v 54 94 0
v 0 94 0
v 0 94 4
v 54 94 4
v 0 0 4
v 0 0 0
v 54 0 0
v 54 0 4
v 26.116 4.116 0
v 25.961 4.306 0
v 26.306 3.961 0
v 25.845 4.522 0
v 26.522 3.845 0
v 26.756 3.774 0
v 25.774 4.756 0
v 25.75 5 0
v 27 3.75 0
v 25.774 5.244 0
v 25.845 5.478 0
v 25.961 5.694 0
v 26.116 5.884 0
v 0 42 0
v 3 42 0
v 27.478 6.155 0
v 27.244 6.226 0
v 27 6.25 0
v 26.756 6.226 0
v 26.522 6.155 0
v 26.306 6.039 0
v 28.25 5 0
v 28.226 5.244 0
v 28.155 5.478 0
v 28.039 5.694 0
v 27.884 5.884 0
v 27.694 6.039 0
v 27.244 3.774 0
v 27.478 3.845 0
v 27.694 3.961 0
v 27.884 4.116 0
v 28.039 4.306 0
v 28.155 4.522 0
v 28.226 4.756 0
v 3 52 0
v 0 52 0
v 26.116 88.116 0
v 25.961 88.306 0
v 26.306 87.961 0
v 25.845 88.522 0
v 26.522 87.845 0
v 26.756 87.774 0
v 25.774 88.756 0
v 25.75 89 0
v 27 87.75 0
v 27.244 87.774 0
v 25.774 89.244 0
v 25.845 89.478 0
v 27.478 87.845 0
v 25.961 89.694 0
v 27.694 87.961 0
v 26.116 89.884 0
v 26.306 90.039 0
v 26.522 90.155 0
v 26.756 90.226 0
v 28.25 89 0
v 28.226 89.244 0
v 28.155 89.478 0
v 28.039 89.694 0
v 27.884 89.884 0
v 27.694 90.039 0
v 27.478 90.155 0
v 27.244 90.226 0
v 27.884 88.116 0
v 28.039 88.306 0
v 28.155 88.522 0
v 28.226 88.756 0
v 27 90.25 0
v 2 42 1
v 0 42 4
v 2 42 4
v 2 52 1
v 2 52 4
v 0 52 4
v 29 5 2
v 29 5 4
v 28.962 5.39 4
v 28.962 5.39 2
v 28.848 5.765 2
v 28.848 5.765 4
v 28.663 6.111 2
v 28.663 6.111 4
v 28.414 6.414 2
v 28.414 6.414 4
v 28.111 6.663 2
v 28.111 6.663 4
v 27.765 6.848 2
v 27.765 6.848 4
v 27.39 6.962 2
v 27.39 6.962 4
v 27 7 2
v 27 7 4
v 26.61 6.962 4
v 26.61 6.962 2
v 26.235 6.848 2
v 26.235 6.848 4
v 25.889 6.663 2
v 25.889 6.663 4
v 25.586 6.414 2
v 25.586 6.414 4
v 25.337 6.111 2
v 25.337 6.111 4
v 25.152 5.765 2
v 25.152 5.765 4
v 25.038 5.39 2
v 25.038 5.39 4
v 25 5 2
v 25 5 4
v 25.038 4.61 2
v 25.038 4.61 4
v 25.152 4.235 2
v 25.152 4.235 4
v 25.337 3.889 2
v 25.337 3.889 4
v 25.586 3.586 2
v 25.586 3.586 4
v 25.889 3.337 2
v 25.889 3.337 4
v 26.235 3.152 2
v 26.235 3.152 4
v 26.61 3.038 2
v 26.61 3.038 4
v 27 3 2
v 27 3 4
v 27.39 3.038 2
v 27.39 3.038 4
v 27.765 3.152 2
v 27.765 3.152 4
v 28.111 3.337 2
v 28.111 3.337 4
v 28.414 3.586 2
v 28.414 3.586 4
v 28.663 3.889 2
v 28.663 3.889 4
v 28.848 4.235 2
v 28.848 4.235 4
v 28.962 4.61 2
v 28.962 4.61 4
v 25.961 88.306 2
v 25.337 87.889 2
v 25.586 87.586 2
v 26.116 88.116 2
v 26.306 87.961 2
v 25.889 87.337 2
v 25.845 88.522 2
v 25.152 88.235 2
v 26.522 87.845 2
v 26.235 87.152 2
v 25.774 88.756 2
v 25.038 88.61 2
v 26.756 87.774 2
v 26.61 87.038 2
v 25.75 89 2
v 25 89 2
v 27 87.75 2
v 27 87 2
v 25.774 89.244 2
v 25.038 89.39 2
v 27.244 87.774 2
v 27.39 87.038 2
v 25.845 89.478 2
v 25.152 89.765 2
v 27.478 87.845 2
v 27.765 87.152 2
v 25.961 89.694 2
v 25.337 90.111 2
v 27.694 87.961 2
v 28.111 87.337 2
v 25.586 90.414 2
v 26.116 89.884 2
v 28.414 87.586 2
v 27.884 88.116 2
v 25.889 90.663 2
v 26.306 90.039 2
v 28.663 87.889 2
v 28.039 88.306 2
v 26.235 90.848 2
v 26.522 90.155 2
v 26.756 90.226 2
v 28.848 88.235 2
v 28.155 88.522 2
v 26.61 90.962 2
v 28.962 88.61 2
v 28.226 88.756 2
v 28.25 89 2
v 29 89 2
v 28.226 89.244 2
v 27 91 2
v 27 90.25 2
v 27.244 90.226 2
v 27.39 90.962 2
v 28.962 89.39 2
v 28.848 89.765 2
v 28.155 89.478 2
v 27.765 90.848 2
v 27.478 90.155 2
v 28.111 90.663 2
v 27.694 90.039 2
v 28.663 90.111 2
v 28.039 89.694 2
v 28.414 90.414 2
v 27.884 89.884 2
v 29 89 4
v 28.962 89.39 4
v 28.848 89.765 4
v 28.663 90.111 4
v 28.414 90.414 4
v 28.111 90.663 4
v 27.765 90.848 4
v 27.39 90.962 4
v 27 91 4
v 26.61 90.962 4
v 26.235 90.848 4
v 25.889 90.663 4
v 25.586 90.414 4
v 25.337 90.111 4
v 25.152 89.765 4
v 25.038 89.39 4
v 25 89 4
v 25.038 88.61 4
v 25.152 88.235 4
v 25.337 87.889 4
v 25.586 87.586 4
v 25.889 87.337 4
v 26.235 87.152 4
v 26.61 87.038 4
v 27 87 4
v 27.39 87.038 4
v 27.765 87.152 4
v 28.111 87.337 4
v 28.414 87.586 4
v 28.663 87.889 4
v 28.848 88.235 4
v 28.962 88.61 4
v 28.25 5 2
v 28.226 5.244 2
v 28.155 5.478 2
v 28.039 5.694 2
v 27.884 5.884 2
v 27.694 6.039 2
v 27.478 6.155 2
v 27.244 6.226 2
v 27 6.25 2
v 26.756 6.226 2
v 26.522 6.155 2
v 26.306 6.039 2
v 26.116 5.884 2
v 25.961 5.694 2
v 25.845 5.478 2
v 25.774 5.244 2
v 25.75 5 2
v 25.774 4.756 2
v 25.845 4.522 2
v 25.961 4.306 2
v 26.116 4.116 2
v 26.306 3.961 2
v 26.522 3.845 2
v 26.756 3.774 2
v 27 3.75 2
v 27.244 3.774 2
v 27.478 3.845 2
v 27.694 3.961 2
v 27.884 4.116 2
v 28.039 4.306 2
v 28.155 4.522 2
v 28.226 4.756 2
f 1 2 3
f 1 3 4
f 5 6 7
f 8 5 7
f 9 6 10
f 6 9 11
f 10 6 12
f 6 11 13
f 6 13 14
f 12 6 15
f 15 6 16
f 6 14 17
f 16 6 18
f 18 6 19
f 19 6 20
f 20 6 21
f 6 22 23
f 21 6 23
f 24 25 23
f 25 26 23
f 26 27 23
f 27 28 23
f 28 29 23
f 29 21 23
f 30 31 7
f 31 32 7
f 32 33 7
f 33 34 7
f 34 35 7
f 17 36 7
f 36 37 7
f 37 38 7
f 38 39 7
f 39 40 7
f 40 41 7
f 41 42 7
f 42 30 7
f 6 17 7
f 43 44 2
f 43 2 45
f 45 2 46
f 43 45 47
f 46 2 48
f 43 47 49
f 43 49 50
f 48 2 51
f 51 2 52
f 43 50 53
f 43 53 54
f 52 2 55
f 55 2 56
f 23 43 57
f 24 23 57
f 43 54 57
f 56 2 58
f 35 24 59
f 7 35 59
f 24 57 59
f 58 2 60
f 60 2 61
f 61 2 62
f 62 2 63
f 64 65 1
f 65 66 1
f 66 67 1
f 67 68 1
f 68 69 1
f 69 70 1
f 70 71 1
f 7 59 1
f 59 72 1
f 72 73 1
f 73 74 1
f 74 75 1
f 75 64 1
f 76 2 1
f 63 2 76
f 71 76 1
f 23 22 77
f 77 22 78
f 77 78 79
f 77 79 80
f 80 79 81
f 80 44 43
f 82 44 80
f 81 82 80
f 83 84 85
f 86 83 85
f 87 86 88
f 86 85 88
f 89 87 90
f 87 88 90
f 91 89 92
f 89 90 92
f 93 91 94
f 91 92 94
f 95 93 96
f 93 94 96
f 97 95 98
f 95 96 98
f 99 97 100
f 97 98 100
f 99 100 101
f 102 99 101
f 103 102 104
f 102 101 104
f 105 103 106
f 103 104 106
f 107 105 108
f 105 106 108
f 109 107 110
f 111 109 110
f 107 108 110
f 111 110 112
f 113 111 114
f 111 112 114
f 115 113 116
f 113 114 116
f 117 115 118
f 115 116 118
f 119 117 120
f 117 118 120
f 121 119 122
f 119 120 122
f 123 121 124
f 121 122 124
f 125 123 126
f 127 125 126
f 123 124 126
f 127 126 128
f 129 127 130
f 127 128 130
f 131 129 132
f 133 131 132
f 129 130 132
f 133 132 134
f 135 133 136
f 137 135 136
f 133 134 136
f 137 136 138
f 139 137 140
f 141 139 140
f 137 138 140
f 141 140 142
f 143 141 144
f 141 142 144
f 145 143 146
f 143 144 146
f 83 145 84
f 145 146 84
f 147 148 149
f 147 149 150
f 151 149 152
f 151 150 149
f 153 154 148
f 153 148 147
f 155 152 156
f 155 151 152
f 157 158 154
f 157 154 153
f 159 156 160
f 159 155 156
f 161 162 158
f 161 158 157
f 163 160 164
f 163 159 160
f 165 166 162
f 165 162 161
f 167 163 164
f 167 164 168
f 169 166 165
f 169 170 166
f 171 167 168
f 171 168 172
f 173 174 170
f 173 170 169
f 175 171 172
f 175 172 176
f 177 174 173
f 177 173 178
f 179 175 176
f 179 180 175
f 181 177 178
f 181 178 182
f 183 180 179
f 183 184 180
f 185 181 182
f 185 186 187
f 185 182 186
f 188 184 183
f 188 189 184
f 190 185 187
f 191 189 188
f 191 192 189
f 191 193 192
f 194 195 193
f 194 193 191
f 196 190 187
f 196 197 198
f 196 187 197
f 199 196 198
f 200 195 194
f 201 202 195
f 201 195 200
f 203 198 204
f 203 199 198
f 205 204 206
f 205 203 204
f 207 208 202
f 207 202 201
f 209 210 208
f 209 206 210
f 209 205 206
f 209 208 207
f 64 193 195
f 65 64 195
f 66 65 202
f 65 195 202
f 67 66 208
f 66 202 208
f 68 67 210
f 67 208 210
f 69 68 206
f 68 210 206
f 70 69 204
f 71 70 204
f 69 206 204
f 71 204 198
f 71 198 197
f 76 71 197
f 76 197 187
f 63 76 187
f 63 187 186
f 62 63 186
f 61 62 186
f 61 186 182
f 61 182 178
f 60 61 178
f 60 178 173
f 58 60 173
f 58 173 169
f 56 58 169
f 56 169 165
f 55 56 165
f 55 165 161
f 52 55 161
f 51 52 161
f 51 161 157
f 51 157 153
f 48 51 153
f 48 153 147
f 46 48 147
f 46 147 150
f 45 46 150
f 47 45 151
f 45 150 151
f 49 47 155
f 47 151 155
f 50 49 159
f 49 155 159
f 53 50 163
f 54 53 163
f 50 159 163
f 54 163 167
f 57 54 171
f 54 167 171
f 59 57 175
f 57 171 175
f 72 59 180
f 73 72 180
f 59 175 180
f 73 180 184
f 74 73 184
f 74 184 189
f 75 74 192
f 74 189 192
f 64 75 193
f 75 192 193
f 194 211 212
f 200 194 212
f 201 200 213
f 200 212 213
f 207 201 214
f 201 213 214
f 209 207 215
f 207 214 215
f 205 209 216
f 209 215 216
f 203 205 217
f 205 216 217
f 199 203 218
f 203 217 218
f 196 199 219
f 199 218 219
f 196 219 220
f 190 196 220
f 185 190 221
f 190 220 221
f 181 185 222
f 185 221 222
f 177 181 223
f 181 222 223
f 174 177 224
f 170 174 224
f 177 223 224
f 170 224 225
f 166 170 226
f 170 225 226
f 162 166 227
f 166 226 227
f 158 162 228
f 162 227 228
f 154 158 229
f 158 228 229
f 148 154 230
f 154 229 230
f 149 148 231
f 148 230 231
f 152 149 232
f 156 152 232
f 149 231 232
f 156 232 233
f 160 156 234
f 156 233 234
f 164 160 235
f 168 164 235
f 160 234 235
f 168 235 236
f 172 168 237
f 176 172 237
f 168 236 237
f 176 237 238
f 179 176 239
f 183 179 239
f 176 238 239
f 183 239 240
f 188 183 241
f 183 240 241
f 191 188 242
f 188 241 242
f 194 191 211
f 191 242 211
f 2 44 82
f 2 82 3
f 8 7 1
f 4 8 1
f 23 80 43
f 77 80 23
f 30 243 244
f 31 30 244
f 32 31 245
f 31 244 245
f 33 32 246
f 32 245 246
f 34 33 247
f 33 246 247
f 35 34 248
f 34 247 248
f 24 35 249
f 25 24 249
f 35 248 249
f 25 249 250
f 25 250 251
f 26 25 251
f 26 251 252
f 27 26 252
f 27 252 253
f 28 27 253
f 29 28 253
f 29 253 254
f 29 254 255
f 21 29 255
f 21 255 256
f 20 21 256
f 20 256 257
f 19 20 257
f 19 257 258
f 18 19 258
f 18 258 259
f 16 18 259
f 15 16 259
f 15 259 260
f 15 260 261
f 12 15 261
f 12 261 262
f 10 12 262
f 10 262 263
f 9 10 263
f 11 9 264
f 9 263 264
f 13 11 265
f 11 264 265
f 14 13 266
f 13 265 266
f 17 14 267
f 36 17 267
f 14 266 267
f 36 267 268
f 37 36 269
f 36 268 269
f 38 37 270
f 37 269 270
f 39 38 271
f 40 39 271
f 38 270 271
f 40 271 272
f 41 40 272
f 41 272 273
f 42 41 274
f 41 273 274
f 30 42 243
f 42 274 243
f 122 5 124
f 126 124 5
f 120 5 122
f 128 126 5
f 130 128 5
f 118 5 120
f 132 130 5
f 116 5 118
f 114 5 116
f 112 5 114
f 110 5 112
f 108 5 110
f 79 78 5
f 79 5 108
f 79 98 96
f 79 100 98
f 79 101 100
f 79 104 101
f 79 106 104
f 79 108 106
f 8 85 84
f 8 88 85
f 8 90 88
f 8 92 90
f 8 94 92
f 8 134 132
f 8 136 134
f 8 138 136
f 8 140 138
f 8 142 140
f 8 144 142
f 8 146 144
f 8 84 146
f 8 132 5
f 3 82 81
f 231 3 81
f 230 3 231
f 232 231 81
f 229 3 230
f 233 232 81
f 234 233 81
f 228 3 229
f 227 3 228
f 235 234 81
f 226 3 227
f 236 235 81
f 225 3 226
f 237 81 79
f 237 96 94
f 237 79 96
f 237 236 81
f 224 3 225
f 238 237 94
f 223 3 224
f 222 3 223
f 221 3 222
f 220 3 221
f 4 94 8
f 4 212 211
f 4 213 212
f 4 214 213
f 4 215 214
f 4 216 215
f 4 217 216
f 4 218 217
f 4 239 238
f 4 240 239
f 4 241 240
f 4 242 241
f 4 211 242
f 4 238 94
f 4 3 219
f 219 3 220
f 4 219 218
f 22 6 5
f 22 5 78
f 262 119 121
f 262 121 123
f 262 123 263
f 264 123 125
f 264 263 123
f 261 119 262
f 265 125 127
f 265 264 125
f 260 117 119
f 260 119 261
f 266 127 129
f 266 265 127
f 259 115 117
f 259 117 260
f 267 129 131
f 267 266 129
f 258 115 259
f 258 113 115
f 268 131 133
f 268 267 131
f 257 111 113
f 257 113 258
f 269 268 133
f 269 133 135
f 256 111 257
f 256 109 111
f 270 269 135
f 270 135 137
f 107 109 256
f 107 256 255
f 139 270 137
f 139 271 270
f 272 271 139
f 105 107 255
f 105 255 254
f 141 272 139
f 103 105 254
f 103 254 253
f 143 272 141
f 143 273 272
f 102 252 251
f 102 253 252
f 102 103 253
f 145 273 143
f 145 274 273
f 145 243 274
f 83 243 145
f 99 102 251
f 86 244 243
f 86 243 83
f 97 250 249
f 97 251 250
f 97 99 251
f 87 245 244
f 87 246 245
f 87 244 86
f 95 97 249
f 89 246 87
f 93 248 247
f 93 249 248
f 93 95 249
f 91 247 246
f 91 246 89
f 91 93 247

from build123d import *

# Parameters (mm, degrees)
SKETCH1_W           = 54
SKETCH1_H           = 94
BOSS_EXTRUDE1_DEPTH = 4
CUT_EXTRUDE1_REACH  = 6
SKETCH2_W           = 2
SKETCH2_H           = 10
SKETCH3_R           = 1.25
CUT_EXTRUDE2_DEPTH  = 5
CHAMFER1_SIZE       = 1
SKETCH4_R           = 2
CUT_EXTRUDE3_DEPTH  = 2


with BuildPart() as part:
    # Sketch1 → Boss-Extrude1 (new body)
    with BuildSketch(Plane.XY):
        with Locations((27, 47)):
            Rectangle(SKETCH1_W, SKETCH1_H)
    extrude(amount=BOSS_EXTRUDE1_DEPTH)

    # Sketch2 → Cut-Extrude1 (cut, up to next)
    with BuildSketch(Plane.XY.offset(4), mode=Mode.PRIVATE) as cut_extrude1_sk1:
        with Locations((1, 47)):
            Rectangle(SKETCH2_W, SKETCH2_H)
    cut_extrude1_tool1 = extrude(cut_extrude1_sk1.sketch, amount=-CUT_EXTRUDE1_REACH, mode=Mode.PRIVATE) & part.part
    add(cut_extrude1_tool1.solids().sort_by_distance((1, 47, 4))[0], mode=Mode.SUBTRACT)

    # Sketch3 → Cut-Extrude2 (cut, through all)
    with BuildSketch(Plane.XY.offset(4)):
        with Locations((27, 89)):
            Circle(SKETCH3_R)
        with Locations((27, 5)):
            Circle(SKETCH3_R)
    extrude(amount=-CUT_EXTRUDE2_DEPTH, mode=Mode.SUBTRACT)

    # Chamfer1
    chamfer1_edges = [part.edges().sort_by_distance(p)[0] for p in [
        (2, 47, 0),
    ]]
    chamfer(chamfer1_edges, length=CHAMFER1_SIZE)

    # Sketch4 → Cut-Extrude3 (cut)
    with BuildSketch(Plane.XY.offset(4)):
        with Locations((27, 89)):
            Circle(SKETCH4_R)
        with Locations((27, 5)):
            Circle(SKETCH4_R)
    extrude(amount=-CUT_EXTRUDE3_DEPTH, mode=Mode.SUBTRACT)


solid = part.part
